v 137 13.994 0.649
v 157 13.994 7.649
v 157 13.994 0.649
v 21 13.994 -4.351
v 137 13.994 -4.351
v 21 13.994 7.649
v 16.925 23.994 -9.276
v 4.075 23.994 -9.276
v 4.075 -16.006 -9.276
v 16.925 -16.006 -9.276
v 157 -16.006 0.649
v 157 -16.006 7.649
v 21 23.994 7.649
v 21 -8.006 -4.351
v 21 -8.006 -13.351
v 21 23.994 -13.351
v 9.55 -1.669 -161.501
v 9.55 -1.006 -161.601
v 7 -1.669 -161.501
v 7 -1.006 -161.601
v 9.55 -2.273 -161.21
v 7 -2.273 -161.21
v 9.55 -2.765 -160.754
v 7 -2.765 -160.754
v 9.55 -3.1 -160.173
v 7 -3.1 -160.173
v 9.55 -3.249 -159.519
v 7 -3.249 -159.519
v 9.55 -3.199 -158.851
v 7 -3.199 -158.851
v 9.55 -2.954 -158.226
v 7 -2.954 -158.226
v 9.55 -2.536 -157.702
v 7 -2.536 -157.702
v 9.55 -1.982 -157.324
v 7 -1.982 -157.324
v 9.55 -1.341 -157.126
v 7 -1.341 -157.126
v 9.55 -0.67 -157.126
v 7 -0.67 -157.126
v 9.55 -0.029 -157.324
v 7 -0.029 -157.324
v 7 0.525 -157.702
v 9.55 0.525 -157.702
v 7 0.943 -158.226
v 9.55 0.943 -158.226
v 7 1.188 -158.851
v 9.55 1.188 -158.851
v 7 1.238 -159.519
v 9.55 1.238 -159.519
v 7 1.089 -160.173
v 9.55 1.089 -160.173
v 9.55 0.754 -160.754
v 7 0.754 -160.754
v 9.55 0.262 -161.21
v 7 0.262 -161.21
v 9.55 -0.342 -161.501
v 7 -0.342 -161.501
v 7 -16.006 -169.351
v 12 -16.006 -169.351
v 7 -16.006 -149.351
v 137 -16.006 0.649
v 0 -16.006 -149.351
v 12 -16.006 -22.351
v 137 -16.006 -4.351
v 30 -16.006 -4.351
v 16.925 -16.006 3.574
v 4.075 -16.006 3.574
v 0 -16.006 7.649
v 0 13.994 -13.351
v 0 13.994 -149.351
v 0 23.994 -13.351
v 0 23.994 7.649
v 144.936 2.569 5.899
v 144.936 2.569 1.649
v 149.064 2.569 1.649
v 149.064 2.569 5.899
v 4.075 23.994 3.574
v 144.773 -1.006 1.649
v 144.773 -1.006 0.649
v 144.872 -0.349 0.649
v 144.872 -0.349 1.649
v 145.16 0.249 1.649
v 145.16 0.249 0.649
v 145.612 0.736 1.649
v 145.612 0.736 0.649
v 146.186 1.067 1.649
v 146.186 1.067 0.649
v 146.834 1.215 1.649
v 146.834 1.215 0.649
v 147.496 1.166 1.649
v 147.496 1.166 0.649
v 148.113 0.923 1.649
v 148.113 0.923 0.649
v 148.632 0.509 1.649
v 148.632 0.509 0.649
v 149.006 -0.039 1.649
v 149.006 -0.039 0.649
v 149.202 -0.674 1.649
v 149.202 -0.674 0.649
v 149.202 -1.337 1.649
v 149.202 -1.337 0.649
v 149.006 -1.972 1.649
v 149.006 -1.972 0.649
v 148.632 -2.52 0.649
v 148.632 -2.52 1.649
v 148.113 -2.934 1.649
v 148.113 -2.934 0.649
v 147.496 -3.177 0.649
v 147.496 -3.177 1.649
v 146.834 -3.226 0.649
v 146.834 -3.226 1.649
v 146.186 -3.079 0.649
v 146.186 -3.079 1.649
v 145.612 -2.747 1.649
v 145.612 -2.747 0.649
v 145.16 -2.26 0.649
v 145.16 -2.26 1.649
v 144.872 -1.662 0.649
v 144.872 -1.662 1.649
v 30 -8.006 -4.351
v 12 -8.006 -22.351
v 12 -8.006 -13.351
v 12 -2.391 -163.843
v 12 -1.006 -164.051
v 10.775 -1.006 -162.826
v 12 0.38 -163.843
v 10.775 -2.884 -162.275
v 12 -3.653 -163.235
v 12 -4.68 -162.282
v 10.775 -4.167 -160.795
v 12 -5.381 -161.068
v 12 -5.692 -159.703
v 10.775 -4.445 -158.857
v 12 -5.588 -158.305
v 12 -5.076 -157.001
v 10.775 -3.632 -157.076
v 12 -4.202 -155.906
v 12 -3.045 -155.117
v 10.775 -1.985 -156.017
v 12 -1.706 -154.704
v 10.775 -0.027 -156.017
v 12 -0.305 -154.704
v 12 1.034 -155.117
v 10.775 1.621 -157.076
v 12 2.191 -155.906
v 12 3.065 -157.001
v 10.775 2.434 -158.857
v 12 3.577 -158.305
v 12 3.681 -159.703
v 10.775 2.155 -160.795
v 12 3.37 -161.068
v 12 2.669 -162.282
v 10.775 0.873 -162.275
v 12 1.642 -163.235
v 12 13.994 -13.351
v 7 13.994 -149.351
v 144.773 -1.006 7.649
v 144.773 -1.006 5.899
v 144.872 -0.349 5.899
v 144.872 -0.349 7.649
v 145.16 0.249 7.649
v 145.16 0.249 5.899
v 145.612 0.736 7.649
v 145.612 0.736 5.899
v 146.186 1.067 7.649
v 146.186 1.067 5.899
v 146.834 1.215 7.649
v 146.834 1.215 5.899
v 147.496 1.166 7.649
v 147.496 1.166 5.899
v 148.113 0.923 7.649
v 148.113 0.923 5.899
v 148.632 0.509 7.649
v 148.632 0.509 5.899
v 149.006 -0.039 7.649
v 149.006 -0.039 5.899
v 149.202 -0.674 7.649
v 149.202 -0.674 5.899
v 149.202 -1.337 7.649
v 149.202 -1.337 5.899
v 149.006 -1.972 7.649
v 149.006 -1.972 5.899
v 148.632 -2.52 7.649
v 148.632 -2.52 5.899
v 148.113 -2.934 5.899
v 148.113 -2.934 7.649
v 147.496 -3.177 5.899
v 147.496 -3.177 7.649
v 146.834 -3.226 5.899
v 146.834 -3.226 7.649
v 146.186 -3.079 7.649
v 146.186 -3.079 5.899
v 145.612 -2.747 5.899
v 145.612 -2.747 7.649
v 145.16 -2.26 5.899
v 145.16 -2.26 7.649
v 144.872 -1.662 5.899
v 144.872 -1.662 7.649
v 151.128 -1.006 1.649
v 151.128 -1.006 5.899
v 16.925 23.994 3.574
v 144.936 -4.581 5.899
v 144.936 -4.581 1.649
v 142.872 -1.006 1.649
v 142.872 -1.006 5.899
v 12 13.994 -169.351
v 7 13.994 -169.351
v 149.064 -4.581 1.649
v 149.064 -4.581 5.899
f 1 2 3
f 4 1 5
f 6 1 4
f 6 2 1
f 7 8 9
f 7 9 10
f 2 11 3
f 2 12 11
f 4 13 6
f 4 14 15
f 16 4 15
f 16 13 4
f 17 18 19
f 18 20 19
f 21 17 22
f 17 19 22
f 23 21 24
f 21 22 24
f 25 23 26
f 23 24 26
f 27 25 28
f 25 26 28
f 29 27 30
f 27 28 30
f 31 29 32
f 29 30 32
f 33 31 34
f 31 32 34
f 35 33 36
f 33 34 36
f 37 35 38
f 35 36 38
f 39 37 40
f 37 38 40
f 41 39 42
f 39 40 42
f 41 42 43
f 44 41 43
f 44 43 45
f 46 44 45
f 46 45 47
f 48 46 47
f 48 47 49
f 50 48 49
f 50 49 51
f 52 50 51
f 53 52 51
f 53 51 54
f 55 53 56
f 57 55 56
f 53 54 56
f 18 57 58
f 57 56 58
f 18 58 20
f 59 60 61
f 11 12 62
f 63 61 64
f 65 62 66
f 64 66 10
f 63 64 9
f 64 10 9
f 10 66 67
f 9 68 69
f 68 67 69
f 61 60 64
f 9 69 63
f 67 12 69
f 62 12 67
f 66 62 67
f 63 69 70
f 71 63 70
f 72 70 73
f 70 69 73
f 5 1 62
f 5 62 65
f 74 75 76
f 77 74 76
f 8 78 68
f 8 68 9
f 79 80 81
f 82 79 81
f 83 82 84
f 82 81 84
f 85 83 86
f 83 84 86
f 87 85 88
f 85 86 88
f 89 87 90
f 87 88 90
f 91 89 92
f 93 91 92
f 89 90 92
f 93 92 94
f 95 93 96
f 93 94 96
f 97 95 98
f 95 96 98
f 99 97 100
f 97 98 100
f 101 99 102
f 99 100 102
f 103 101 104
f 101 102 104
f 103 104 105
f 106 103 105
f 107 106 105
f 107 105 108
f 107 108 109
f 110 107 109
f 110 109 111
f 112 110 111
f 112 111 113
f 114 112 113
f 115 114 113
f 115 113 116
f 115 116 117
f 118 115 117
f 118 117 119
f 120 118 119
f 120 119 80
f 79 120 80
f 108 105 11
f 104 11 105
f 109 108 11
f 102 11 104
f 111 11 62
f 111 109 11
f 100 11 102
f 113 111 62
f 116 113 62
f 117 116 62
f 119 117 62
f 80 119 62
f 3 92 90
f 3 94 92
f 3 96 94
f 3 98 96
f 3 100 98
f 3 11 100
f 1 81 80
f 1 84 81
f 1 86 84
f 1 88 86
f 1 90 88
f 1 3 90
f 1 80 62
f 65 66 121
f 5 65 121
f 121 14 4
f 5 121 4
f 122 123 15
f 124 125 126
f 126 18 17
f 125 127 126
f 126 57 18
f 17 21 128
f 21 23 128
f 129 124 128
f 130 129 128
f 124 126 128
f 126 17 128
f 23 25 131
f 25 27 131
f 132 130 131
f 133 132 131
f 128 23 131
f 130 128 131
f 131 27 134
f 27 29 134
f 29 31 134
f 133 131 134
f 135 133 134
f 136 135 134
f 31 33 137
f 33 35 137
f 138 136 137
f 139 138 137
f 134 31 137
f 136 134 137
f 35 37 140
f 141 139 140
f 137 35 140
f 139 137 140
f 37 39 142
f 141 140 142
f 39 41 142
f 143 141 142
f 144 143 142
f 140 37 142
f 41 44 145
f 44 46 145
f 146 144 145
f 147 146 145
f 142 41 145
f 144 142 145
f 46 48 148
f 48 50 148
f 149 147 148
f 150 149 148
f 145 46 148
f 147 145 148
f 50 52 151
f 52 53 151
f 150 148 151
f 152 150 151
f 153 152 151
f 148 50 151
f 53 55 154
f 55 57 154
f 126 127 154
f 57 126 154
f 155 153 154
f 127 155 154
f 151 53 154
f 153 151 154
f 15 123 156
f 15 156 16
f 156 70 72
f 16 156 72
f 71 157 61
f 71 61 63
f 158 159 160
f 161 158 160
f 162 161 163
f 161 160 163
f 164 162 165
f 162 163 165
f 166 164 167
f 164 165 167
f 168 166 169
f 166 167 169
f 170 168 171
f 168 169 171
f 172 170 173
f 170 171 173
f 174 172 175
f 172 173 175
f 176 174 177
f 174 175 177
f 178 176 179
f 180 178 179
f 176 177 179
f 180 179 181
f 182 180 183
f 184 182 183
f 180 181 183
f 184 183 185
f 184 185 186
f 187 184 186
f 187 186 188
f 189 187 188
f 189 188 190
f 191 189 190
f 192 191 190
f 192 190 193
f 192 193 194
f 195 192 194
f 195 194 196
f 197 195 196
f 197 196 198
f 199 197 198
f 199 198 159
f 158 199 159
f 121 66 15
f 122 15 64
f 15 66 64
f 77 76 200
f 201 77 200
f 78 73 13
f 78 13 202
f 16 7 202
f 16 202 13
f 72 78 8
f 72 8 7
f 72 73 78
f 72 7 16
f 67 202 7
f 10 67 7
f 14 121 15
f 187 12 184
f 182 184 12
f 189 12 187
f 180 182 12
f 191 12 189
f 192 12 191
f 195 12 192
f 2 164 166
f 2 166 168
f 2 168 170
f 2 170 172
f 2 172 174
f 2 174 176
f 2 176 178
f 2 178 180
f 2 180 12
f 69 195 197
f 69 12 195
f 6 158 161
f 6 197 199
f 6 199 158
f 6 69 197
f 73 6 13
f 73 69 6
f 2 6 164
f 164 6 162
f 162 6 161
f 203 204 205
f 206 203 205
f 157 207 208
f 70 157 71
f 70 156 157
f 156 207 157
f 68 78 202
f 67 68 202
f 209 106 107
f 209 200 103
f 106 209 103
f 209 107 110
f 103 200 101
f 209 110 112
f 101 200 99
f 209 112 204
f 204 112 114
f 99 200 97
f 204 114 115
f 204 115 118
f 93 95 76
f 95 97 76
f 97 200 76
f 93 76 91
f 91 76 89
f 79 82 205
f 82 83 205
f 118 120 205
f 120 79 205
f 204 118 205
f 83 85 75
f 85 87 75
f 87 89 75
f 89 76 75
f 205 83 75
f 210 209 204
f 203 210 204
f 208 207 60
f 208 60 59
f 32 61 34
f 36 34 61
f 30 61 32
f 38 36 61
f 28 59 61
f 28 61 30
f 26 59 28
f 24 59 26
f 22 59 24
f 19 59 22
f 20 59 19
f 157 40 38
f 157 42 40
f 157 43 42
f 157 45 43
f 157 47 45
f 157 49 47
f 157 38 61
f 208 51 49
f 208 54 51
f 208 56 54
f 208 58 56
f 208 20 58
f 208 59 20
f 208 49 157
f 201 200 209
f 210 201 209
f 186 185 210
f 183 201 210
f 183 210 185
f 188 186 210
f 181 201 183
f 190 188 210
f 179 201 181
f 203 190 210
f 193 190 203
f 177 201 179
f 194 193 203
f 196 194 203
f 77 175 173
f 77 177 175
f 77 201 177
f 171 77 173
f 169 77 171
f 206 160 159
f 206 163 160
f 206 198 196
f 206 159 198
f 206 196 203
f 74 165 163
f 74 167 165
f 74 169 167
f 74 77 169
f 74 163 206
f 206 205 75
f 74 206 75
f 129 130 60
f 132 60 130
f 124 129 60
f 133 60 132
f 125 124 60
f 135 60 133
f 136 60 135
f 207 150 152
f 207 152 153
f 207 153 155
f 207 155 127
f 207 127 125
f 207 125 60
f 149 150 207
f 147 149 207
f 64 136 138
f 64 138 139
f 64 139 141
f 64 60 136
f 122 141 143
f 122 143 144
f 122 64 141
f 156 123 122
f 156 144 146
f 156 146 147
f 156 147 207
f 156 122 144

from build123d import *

# Parameters (mm, degrees)
SKETCH1_W                                           = 21
SKETCH1_H                                           = 40
BOSS_EXTRUDE1_DEPTH                                 = 21
SKETCH8_W                                           = 12.85
SKETCH8_H                                           = 12.85
CUT_EXTRUDE2_DEPTH                                  = 40
SKETCH7_W                                           = 12
SKETCH7_H                                           = 30
BOSS_EXTRUDE5_DEPTH                                 = 156
SKETCH9_W                                           = 12
SKETCH9_H                                           = 30
BOSS_EXTRUDE6_DEPTH                                 = 116
SKETCH10_W                                          = 6
SKETCH10_H                                          = 30
BOSS_EXTRUDE7_DEPTH                                 = 20
SKETCH11_W                                          = 7
SKETCH11_H                                          = 30
CUT_EXTRUDE3_DEPTH                                  = 20
CUT_EXTRUDE7_DEPTH                                  = 4.25
CSK_FOR_M4_COUNTERSUNK_FLAT_HEAD_SCREW1_D           = 4.5
CSK_FOR_M4_COUNTERSUNK_FLAT_HEAD_SCREW1_DEPTH       = 16
CSK_FOR_M4_COUNTERSUNK_FLAT_HEAD_SCREW1_CSINK_D     = 9.4
CSK_FOR_M4_COUNTERSUNK_FLAT_HEAD_SCREW1_CSINK_ANGLE = 90
CSK_FOR_M4_COUNTERSUNK_FLAT_HEAD_SCREW1_TIP         = 1.351936393
BOSS_EXTRUDE10_DEPTH                                = 8
BOSS_EXTRUDE11_DEPTH                                = 8
SKETCH27_W                                          = 20
SKETCH27_H                                          = 30
BOSS_EXTRUDE12_DEPTH                                = 1
SKETCH18_R                                          = 2.226933834
CUT_EXTRUDE10_DEPTH                                 = 10.4


with BuildPart() as part:
    # Sketch1 → Boss-Extrude1 (new body)
    with BuildSketch(Plane(origin=(0, 0, 0), x_dir=(0, 0, -1), z_dir=(1, 0, 0))):
        with Locations((2.851327434, 3.994469027)):
            Rectangle(SKETCH1_W, SKETCH1_H)
    extrude(amount=BOSS_EXTRUDE1_DEPTH)

    # Sketch8 → Cut-Extrude2 (cut)
    with BuildSketch(Plane(origin=(0, 23.994469027, 0), x_dir=(1, 0, 0), z_dir=(0, 1, 0))):
        with Locations((10.5, 2.851327434)):
            Rectangle(SKETCH8_W, SKETCH8_H)
    extrude(amount=-CUT_EXTRUDE2_DEPTH, mode=Mode.SUBTRACT)

    # Sketch7 → Boss-Extrude5 (add)
    with BuildSketch(Plane(origin=(0, 0, -13.351327434), x_dir=(-1, 0, 0), z_dir=(0, 0, -1))):
        with Locations((-6, -1.005530973)):
            Rectangle(SKETCH7_W, SKETCH7_H)
    extrude(amount=BOSS_EXTRUDE5_DEPTH)

    # Sketch9 → Boss-Extrude6 (add)
    with BuildSketch(Plane(origin=(21, 0, 0), x_dir=(0, 0, -1), z_dir=(1, 0, 0))):
        with Locations((-1.648672566, -1.005530973)):
            Rectangle(SKETCH9_W, SKETCH9_H)
    extrude(amount=BOSS_EXTRUDE6_DEPTH)

    # Sketch10 → Boss-Extrude7 (add)
    with BuildSketch(Plane(origin=(137, 0, 0), x_dir=(0, 0, -1), z_dir=(1, 0, 0))):
        with Locations((-4.648672566, -1.005530973)):
            Rectangle(SKETCH10_W, SKETCH10_H)
    extrude(amount=BOSS_EXTRUDE7_DEPTH)

    # Sketch11 → Cut-Extrude3 (cut)
    with BuildSketch(Plane(origin=(0, 0, -169.351327434), x_dir=(-1, 0, 0), z_dir=(0, 0, -1))):
        with Locations((-3.5, -1.005530973)):
            Rectangle(SKETCH11_W, SKETCH11_H)
    extrude(amount=-CUT_EXTRUDE3_DEPTH, mode=Mode.SUBTRACT)

    # Sketch16 → Cut-Extrude7 (cut)
    with BuildSketch(Plane(origin=(0, 0, 1.648672566), x_dir=(-1, 0, 0), z_dir=(0, 0, -1))):
        Polygon((-149.064027212, 2.569469027), (-151.128054425, -1.005530973), (-149.064027212, -4.580530973), (-144.935972788, -4.580530973), (-142.871945575, -1.005530973), (-144.935972788, 2.569469027), align=None)
    extrude(amount=-CUT_EXTRUDE7_DEPTH, mode=Mode.SUBTRACT)

    # CSK for M4 Countersunk Flat Head Screw1
    with Locations(Plane(origin=(12, 0, 0), x_dir=(0, 0, 1), z_dir=(1, 0, 0))):
        with Locations((-159.351327434, 1.005530973)):
            CounterSinkHole(CSK_FOR_M4_COUNTERSUNK_FLAT_HEAD_SCREW1_D / 2, CSK_FOR_M4_COUNTERSUNK_FLAT_HEAD_SCREW1_CSINK_D / 2, depth=CSK_FOR_M4_COUNTERSUNK_FLAT_HEAD_SCREW1_DEPTH, counter_sink_angle=CSK_FOR_M4_COUNTERSUNK_FLAT_HEAD_SCREW1_CSINK_ANGLE)
            with Locations((0, 0, -(CSK_FOR_M4_COUNTERSUNK_FLAT_HEAD_SCREW1_DEPTH + CSK_FOR_M4_COUNTERSUNK_FLAT_HEAD_SCREW1_TIP / 2))):  # 118° drill point
                Cone(0, CSK_FOR_M4_COUNTERSUNK_FLAT_HEAD_SCREW1_D / 2, CSK_FOR_M4_COUNTERSUNK_FLAT_HEAD_SCREW1_TIP, mode=Mode.SUBTRACT)

    # Sketch24 → Boss-Extrude10 (add)
    with BuildSketch(Plane(origin=(0, -16.005530973, 0), x_dir=(-1, 0, 0), z_dir=(0, -1, 0))):
        Polygon((-21, 13.351327434), (-30, 4.351327434), (-21, 4.351327434), align=None)
    extrude(amount=-BOSS_EXTRUDE10_DEPTH)

    # Sketch25 → Boss-Extrude11 (add)
    with BuildSketch(Plane(origin=(0, -16.005530973, 0), x_dir=(-1, 0, 0), z_dir=(0, -1, 0))):
        Polygon((-21, 13.351327434), (-12, 22.351327434), (-12, 13.351327434), align=None)
    extrude(amount=-BOSS_EXTRUDE11_DEPTH)

    # Sketch27 → Boss-Extrude12 (add)
    with BuildSketch(Plane(origin=(0, 0, 1.648672566), x_dir=(-1, 0, 0), z_dir=(0, 0, -1))):
        with Locations((-147, -1.005530973)):
            Rectangle(SKETCH27_W, SKETCH27_H)
    extrude(amount=BOSS_EXTRUDE12_DEPTH)

    # Sketch18 → Cut-Extrude10 (cut)
    with BuildSketch(Plane(origin=(0, 0, 0.648672566), x_dir=(-1, 0, 0), z_dir=(0, 0, -1))):
        with Locations((-147, -1.005530973)):
            Circle(SKETCH18_R)
    extrude(amount=-CUT_EXTRUDE10_DEPTH, mode=Mode.SUBTRACT)


solid = part.part
